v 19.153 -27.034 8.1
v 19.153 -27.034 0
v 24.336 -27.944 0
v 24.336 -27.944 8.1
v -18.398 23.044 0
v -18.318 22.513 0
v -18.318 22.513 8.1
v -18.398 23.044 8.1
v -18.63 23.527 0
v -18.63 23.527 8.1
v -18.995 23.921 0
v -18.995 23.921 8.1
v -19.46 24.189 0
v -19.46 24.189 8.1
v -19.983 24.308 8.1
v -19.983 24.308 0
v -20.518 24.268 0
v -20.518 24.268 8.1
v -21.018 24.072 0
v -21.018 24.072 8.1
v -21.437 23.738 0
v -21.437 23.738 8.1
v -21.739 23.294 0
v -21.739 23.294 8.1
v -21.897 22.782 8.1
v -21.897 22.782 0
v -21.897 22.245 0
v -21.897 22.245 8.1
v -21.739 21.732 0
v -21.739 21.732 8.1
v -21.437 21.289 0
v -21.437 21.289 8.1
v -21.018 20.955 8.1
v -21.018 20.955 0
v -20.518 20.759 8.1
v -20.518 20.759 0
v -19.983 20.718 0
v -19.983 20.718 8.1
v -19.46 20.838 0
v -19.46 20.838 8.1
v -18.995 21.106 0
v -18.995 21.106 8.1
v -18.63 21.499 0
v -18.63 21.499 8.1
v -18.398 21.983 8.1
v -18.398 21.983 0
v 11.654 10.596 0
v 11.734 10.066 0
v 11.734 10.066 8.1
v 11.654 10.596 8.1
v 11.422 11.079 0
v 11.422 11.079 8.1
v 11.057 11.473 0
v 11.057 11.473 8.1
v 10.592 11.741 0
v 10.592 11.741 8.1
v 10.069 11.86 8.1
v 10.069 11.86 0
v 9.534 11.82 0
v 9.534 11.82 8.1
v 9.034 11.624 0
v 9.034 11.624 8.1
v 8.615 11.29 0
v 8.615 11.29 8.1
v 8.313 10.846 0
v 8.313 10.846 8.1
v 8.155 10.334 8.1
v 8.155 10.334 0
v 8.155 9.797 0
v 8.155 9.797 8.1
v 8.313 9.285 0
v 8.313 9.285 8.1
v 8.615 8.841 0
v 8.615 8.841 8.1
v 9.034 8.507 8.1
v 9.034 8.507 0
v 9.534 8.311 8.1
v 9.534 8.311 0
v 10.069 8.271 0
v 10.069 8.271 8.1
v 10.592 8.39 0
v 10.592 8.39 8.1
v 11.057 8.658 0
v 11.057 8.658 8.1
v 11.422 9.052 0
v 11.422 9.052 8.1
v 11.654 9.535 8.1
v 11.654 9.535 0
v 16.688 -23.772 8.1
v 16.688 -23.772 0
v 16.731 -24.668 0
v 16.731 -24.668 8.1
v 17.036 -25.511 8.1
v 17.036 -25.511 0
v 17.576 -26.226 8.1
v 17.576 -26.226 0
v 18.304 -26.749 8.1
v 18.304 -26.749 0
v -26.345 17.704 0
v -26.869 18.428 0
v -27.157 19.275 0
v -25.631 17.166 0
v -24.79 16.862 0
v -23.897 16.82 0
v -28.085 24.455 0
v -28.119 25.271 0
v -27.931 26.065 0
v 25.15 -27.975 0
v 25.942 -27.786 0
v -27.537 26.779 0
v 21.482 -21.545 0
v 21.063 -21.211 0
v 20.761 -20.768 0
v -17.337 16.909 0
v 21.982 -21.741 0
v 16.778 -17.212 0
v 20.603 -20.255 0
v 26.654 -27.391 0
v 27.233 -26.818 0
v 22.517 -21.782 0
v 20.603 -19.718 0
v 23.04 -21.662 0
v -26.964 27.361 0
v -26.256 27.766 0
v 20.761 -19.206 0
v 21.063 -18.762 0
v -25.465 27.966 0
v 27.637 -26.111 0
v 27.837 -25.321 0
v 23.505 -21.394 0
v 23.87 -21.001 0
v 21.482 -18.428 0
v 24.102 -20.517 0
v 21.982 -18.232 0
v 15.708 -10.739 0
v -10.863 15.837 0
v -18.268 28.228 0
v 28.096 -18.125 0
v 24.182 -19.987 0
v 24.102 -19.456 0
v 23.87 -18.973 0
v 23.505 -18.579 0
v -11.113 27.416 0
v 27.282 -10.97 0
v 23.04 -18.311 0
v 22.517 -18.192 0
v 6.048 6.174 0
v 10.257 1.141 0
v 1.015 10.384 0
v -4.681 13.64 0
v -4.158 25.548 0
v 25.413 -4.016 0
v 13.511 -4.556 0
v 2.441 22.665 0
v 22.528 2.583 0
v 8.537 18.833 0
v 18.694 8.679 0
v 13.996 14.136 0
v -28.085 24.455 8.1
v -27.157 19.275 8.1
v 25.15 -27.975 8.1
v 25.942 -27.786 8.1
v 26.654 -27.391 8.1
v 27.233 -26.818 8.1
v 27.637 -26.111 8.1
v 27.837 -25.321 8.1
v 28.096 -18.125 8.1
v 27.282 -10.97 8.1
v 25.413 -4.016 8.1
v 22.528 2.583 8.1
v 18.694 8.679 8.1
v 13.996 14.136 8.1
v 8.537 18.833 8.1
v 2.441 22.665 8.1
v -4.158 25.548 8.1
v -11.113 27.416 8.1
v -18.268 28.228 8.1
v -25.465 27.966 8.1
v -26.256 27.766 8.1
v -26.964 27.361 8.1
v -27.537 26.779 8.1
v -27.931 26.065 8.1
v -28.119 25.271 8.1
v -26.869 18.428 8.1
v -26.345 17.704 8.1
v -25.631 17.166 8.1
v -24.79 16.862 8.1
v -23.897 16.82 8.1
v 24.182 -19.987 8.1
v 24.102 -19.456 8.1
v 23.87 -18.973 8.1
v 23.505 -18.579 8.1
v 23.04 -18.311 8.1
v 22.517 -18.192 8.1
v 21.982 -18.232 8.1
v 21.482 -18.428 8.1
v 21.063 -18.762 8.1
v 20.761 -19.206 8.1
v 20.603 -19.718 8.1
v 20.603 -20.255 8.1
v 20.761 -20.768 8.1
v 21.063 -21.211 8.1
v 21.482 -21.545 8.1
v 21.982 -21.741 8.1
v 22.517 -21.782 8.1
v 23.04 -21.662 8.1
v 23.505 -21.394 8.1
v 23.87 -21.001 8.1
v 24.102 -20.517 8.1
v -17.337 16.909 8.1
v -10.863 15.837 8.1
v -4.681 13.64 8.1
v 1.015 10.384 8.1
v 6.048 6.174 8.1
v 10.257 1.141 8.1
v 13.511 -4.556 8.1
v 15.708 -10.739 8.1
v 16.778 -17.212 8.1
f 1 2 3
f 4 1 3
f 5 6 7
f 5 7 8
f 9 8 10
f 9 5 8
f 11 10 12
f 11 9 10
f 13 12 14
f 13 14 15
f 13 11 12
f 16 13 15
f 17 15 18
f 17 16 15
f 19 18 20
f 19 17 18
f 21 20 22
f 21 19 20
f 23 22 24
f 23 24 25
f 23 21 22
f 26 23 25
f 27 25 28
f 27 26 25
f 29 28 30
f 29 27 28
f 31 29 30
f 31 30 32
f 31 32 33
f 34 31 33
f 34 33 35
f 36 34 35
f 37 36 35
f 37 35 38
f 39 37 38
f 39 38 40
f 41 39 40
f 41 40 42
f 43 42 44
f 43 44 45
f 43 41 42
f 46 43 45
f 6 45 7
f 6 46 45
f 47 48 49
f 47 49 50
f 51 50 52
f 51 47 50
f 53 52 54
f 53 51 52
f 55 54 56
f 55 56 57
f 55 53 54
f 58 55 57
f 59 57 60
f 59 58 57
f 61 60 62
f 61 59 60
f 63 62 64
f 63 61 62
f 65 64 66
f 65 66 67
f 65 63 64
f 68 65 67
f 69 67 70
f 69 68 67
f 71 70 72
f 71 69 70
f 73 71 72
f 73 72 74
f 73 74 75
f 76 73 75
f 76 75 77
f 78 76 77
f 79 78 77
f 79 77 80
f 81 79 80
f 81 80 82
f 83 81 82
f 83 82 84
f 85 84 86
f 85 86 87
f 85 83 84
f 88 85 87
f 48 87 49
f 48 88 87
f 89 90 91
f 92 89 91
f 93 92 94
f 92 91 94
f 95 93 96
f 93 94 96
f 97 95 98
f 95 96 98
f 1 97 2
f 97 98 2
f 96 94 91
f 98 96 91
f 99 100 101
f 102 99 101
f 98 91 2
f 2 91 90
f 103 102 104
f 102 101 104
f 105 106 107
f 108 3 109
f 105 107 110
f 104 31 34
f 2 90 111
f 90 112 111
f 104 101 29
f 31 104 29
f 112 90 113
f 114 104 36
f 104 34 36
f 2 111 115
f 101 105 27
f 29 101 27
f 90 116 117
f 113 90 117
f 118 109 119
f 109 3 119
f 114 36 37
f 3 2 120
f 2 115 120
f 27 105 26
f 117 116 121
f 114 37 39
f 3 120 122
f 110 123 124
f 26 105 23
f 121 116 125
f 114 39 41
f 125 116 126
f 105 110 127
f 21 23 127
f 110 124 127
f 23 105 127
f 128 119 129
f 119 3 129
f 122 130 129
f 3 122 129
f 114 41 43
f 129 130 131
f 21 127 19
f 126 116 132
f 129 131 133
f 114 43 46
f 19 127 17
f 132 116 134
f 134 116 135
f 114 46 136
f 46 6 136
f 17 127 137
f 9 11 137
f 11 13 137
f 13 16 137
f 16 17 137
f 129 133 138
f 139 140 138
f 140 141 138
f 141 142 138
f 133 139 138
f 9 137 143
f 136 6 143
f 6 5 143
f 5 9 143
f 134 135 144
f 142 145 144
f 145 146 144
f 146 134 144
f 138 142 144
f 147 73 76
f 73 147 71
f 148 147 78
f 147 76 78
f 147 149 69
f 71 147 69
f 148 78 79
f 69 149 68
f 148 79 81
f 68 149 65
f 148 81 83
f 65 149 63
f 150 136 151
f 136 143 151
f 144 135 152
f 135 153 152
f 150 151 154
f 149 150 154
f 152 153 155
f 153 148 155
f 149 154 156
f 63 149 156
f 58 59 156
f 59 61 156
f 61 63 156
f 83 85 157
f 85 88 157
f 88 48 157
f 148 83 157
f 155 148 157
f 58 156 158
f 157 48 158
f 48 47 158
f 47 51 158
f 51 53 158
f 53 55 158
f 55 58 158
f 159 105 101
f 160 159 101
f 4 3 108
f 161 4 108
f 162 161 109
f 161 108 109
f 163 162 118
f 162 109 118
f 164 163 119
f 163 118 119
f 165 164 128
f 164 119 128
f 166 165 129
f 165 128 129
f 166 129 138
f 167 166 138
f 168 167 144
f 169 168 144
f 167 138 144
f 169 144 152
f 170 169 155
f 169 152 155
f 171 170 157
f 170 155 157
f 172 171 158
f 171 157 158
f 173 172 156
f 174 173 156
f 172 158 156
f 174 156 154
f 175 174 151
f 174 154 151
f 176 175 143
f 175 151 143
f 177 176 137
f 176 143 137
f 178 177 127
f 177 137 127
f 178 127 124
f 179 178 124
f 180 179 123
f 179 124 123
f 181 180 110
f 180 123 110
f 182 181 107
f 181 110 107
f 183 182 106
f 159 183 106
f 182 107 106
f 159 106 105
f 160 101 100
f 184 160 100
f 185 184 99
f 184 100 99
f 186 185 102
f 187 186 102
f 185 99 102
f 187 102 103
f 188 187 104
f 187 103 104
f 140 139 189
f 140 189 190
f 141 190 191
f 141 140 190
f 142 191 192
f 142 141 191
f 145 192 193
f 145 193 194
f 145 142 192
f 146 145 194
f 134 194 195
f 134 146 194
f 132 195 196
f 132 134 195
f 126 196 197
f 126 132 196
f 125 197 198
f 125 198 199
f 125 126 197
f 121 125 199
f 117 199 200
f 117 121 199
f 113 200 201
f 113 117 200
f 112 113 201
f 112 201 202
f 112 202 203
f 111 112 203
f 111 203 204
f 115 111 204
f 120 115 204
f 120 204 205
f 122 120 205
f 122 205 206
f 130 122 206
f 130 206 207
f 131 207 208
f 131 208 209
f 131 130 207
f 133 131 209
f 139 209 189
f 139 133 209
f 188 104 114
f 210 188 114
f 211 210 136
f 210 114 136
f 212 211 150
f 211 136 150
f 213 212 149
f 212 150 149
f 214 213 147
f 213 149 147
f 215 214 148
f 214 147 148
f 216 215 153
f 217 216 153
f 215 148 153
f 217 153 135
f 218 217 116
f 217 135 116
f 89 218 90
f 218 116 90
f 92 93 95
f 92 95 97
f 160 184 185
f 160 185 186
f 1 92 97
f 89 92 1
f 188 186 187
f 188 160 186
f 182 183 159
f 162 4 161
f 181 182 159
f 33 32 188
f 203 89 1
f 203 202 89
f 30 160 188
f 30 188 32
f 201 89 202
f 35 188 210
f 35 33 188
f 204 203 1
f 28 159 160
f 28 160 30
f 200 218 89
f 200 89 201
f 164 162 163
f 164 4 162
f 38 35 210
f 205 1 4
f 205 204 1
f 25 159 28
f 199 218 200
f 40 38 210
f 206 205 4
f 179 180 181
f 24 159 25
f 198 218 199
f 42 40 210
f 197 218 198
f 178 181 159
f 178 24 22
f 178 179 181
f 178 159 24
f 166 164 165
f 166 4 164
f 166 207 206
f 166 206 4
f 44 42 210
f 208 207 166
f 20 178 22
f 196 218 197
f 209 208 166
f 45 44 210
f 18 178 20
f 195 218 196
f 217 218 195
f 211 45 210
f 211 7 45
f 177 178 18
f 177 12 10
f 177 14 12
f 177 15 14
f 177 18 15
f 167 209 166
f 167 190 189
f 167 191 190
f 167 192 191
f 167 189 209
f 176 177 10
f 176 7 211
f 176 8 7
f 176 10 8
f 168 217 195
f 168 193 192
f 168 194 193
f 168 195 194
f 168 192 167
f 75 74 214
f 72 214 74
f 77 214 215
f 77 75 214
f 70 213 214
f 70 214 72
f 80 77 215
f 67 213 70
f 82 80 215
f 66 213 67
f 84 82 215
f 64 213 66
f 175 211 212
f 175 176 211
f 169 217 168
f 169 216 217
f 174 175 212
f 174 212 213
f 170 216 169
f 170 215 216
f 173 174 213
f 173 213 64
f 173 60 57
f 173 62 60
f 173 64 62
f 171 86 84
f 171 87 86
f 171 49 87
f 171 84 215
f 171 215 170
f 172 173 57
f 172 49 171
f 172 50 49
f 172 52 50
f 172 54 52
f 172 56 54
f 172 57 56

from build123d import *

# Parameters (mm, degrees)
SKETCH_1_R      = 1.8
EXTRUDE_1_DEPTH = 8.1


with BuildPart() as part:
    # 草图1 → 凸台-拉伸1 (new body)
    with BuildSketch(Plane.XY):
        with BuildLine():
            Line((-28.085321485, 24.455311821), (-27.156538847, 19.274809777))
            ThreePointArc((-27.156538847, 19.274809777), (-26.008495854, 17.407885349), (-23.897169242, 16.819914712))
            ThreePointArc((-23.897169242, 16.819914712), (6.047612353, 6.174156813), (16.688201762, -23.772461744))
            ThreePointArc((16.688201762, -23.772461744), (17.279148071, -25.888317514), (19.153455893, -27.034194196))
            Line((19.153455893, -27.034194196), (24.335957665, -27.944492213))
            ThreePointArc((24.335957665, -27.944492213), (26.653907402, -27.390513858), (27.836563196, -25.321429936))
            ThreePointArc((27.836563196, -25.321429936), (13.995899045, 14.135772324), (-25.464877169, 27.96624357))
            ThreePointArc((-25.464877169, 27.96624357), (-27.536589514, 26.779128998), (-28.085321485, 24.455311821))
        make_face()
        with Locations((22.382403744, -19.986536191)):
            Circle(SKETCH_1_R, mode=Mode.SUBTRACT)
        with Locations((9.934441945, 10.06550201)):
            Circle(SKETCH_1_R, mode=Mode.SUBTRACT)
        with Locations((-20.117596256, 22.513463809)):
            Circle(SKETCH_1_R, mode=Mode.SUBTRACT)
    extrude(amount=EXTRUDE_1_DEPTH)


solid = part.part
